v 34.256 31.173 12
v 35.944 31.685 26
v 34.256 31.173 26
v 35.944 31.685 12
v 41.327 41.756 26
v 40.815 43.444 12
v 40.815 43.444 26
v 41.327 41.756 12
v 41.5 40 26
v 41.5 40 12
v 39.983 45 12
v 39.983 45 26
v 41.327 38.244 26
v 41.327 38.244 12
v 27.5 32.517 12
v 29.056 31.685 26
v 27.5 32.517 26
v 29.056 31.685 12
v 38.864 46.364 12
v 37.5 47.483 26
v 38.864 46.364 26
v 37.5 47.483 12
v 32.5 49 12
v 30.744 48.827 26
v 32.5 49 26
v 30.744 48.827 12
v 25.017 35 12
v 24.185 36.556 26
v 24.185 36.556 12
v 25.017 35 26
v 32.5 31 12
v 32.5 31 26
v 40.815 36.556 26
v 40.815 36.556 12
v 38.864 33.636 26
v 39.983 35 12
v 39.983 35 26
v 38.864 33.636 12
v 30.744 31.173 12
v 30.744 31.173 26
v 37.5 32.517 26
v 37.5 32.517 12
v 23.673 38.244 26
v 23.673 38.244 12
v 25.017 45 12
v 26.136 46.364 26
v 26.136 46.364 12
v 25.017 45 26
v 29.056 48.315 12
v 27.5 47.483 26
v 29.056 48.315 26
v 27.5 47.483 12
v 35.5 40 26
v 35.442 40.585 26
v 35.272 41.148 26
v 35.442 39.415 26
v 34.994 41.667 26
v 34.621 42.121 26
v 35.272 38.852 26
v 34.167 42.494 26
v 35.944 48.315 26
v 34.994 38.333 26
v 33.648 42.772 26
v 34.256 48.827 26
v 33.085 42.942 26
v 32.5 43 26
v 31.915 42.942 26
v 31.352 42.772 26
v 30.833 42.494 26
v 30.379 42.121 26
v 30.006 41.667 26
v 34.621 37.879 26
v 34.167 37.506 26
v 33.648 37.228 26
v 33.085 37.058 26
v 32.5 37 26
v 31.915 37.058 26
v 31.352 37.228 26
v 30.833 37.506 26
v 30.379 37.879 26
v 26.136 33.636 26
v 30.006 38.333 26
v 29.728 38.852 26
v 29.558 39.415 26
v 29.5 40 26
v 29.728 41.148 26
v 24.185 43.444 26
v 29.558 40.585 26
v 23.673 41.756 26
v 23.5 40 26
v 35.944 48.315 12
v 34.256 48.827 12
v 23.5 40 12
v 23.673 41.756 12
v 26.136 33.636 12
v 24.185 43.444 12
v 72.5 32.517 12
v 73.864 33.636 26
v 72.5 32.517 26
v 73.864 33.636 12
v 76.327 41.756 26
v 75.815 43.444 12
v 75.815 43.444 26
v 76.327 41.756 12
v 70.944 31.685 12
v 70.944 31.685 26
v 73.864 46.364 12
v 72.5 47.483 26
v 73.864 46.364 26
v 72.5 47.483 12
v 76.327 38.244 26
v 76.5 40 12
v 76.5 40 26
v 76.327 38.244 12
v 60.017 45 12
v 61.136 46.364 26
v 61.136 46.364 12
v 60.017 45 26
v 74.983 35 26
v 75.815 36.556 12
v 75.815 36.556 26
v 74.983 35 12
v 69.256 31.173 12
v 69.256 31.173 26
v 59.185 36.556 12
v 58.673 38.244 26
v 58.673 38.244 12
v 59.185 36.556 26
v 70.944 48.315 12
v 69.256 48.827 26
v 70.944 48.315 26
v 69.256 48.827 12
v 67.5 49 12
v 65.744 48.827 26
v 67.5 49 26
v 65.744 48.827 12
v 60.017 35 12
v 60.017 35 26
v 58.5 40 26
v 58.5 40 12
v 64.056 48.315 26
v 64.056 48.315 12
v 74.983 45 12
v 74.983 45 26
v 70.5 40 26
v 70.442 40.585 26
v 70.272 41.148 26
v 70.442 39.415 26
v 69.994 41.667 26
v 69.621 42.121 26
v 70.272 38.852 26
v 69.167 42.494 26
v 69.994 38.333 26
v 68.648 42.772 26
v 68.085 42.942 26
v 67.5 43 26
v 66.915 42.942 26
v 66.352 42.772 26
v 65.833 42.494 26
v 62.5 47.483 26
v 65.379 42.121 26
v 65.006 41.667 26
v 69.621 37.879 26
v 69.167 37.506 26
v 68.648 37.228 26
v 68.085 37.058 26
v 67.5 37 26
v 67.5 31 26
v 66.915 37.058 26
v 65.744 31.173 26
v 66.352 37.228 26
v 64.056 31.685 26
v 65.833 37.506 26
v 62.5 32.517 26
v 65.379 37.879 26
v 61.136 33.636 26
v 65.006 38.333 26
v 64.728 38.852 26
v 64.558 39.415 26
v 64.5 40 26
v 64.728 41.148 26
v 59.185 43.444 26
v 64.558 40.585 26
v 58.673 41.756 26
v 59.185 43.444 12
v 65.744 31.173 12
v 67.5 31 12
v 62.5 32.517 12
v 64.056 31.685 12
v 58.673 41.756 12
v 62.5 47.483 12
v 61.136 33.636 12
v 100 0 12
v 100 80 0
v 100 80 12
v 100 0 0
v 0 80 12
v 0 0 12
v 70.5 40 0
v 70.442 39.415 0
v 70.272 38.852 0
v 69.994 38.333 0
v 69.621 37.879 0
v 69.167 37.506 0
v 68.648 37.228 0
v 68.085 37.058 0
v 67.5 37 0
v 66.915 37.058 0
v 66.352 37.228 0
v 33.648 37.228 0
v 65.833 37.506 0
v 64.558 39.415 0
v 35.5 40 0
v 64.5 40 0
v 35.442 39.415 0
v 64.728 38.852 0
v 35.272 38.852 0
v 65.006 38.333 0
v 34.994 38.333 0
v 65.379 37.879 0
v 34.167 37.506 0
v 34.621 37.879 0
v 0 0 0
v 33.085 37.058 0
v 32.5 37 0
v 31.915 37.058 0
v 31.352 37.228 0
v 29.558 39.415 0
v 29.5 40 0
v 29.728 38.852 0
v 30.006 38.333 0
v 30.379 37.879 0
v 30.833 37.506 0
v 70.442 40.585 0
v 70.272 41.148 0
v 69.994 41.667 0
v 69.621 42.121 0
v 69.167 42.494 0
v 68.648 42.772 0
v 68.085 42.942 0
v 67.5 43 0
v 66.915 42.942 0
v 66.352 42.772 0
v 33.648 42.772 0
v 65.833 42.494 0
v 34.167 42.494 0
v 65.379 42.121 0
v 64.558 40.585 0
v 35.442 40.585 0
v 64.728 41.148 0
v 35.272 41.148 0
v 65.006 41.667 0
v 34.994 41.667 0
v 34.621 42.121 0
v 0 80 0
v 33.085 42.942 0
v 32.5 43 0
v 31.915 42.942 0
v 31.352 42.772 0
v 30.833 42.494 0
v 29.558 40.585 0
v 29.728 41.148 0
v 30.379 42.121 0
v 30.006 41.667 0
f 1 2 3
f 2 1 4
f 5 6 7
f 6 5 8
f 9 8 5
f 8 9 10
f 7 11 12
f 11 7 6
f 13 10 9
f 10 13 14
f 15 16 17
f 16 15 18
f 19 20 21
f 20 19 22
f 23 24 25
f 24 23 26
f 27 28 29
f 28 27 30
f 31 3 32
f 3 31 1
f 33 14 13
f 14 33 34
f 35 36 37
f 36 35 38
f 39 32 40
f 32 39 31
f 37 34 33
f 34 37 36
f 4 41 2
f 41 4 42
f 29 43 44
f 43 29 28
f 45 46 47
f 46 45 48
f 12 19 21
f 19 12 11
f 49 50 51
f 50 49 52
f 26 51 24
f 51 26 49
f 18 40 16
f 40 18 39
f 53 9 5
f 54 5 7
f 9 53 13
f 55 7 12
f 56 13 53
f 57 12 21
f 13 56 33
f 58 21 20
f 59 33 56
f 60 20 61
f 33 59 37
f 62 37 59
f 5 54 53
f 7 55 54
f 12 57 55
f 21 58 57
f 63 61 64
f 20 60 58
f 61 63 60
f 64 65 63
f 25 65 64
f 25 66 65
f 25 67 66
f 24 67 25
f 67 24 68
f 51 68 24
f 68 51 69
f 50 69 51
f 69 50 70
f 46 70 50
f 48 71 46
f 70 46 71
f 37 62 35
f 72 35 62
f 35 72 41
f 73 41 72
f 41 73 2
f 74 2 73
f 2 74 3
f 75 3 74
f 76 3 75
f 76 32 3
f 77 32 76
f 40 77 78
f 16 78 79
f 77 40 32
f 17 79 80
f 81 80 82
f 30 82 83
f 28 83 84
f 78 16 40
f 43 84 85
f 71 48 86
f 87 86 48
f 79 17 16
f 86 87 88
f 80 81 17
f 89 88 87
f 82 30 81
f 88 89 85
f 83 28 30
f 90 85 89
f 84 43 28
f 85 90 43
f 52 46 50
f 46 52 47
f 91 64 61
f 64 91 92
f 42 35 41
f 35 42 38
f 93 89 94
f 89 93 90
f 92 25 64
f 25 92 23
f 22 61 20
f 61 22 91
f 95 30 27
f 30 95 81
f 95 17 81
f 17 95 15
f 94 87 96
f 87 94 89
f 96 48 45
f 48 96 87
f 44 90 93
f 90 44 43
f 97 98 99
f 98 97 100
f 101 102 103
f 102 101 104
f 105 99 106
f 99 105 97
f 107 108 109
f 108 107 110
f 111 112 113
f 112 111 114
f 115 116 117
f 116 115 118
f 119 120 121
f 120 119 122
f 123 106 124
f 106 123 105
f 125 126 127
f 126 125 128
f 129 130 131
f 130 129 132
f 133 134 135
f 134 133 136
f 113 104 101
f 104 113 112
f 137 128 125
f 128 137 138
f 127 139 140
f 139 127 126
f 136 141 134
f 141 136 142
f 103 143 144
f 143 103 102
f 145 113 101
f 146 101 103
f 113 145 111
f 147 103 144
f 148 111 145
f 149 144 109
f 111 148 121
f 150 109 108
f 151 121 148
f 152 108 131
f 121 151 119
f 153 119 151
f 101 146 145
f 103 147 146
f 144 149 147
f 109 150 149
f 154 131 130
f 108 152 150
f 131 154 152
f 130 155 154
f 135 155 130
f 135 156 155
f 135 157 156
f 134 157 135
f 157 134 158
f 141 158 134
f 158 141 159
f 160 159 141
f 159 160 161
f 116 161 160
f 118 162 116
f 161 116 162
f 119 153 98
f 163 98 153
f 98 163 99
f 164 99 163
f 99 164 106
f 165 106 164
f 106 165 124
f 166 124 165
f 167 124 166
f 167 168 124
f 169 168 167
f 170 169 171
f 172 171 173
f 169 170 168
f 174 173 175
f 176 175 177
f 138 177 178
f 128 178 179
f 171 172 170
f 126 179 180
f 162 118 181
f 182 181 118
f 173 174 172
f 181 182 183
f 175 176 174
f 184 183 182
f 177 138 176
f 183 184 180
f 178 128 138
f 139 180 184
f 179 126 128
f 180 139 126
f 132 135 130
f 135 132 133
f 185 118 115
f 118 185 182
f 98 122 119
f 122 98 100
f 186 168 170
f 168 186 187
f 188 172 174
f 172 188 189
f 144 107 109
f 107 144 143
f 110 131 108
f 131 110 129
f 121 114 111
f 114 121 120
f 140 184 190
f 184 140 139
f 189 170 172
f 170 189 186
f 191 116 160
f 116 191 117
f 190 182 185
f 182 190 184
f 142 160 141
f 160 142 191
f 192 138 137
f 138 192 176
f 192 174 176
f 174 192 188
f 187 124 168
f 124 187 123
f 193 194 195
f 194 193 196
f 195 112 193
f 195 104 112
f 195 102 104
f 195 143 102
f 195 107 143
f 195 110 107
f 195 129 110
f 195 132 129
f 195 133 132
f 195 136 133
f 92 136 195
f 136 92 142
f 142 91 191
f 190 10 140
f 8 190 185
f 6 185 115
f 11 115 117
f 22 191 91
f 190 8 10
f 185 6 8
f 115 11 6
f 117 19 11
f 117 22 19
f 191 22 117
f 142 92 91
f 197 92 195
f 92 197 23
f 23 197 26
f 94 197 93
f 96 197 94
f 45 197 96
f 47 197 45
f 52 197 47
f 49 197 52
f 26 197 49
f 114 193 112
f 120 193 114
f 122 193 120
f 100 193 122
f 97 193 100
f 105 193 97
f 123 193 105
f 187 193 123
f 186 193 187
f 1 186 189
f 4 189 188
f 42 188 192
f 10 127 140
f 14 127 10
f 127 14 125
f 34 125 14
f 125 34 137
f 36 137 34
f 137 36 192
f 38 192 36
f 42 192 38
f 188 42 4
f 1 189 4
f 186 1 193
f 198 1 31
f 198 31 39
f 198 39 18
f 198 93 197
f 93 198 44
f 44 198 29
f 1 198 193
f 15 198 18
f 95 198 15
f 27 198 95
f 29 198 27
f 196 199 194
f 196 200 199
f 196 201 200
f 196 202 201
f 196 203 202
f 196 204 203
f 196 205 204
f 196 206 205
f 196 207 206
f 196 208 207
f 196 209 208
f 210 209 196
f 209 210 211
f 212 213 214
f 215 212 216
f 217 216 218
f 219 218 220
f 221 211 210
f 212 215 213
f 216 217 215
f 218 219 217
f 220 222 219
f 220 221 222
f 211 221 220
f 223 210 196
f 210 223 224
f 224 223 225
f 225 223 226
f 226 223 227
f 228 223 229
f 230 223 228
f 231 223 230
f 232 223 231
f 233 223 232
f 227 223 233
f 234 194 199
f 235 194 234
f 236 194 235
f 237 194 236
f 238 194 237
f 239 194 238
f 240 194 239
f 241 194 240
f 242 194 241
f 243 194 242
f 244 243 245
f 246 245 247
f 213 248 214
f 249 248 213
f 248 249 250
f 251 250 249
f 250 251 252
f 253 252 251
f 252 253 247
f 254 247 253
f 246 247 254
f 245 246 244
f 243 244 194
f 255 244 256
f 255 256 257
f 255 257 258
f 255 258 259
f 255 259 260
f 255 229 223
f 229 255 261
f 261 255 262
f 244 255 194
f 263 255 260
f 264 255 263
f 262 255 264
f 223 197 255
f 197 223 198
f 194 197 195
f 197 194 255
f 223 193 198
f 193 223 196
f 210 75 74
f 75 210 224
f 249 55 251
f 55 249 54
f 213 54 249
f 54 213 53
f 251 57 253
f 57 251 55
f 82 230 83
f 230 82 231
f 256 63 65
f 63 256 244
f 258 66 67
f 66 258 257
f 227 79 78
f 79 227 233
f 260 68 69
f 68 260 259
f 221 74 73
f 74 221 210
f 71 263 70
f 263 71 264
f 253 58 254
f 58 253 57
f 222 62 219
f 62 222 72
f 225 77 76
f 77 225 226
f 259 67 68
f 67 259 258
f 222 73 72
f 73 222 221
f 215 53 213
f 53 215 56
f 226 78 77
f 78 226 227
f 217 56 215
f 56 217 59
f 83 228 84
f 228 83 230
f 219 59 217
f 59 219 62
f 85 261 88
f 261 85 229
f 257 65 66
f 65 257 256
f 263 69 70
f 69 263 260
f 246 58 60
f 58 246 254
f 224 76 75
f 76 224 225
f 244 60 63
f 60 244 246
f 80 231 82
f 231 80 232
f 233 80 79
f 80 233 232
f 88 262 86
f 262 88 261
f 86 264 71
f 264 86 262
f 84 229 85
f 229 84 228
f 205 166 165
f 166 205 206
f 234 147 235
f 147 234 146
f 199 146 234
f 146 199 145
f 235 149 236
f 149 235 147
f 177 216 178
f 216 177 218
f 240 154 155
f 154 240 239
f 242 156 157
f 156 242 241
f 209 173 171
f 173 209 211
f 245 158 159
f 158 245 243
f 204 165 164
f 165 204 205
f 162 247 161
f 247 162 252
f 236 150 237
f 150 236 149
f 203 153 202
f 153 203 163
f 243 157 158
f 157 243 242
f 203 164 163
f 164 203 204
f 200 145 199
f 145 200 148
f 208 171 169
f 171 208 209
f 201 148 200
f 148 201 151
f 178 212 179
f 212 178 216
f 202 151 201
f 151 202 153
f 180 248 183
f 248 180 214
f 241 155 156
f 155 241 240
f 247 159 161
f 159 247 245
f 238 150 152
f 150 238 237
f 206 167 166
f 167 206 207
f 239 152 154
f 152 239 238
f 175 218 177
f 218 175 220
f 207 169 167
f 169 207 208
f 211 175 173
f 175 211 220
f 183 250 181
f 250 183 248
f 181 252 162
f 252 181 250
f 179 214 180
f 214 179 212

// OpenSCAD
$fn = 32;

// ----------------------------------------------------------------------
// Drill jig: two_boss jig
// ----------------------------------------------------------------------

// --- parameters (mm) ---
plate_l = 100;            // plate length, X
plate_w = 80;             // plate width, Y
plate_t = 12;             // plate thickness
boss_d = 18;              // guide boss diameter
boss_h = 15;              // boss height above the plate
guide_d = 6;              // guide hole diameter
boss_pitch = 35;          // boss pitch

n_boss = 2;  // guide bosses
boss_x0 = (plate_l - (n_boss - 1) * boss_pitch) / 2;  // first boss X
boss_top = plate_t - 1 + boss_h;  // boss crown height
total_h = boss_top;  // overall height

difference() {
  union() {
  cube([plate_l, plate_w, plate_t]);
  for (i = [0 : n_boss - 1])
    translate([boss_x0 + i * boss_pitch, plate_w / 2, plate_t - 1])
      cylinder(h = boss_h, d = boss_d);
  }
  for (i = [0 : n_boss - 1])
    translate([boss_x0 + i * boss_pitch, plate_w / 2, -1])
      cylinder(h = plate_t + boss_h, d = guide_d);
}
